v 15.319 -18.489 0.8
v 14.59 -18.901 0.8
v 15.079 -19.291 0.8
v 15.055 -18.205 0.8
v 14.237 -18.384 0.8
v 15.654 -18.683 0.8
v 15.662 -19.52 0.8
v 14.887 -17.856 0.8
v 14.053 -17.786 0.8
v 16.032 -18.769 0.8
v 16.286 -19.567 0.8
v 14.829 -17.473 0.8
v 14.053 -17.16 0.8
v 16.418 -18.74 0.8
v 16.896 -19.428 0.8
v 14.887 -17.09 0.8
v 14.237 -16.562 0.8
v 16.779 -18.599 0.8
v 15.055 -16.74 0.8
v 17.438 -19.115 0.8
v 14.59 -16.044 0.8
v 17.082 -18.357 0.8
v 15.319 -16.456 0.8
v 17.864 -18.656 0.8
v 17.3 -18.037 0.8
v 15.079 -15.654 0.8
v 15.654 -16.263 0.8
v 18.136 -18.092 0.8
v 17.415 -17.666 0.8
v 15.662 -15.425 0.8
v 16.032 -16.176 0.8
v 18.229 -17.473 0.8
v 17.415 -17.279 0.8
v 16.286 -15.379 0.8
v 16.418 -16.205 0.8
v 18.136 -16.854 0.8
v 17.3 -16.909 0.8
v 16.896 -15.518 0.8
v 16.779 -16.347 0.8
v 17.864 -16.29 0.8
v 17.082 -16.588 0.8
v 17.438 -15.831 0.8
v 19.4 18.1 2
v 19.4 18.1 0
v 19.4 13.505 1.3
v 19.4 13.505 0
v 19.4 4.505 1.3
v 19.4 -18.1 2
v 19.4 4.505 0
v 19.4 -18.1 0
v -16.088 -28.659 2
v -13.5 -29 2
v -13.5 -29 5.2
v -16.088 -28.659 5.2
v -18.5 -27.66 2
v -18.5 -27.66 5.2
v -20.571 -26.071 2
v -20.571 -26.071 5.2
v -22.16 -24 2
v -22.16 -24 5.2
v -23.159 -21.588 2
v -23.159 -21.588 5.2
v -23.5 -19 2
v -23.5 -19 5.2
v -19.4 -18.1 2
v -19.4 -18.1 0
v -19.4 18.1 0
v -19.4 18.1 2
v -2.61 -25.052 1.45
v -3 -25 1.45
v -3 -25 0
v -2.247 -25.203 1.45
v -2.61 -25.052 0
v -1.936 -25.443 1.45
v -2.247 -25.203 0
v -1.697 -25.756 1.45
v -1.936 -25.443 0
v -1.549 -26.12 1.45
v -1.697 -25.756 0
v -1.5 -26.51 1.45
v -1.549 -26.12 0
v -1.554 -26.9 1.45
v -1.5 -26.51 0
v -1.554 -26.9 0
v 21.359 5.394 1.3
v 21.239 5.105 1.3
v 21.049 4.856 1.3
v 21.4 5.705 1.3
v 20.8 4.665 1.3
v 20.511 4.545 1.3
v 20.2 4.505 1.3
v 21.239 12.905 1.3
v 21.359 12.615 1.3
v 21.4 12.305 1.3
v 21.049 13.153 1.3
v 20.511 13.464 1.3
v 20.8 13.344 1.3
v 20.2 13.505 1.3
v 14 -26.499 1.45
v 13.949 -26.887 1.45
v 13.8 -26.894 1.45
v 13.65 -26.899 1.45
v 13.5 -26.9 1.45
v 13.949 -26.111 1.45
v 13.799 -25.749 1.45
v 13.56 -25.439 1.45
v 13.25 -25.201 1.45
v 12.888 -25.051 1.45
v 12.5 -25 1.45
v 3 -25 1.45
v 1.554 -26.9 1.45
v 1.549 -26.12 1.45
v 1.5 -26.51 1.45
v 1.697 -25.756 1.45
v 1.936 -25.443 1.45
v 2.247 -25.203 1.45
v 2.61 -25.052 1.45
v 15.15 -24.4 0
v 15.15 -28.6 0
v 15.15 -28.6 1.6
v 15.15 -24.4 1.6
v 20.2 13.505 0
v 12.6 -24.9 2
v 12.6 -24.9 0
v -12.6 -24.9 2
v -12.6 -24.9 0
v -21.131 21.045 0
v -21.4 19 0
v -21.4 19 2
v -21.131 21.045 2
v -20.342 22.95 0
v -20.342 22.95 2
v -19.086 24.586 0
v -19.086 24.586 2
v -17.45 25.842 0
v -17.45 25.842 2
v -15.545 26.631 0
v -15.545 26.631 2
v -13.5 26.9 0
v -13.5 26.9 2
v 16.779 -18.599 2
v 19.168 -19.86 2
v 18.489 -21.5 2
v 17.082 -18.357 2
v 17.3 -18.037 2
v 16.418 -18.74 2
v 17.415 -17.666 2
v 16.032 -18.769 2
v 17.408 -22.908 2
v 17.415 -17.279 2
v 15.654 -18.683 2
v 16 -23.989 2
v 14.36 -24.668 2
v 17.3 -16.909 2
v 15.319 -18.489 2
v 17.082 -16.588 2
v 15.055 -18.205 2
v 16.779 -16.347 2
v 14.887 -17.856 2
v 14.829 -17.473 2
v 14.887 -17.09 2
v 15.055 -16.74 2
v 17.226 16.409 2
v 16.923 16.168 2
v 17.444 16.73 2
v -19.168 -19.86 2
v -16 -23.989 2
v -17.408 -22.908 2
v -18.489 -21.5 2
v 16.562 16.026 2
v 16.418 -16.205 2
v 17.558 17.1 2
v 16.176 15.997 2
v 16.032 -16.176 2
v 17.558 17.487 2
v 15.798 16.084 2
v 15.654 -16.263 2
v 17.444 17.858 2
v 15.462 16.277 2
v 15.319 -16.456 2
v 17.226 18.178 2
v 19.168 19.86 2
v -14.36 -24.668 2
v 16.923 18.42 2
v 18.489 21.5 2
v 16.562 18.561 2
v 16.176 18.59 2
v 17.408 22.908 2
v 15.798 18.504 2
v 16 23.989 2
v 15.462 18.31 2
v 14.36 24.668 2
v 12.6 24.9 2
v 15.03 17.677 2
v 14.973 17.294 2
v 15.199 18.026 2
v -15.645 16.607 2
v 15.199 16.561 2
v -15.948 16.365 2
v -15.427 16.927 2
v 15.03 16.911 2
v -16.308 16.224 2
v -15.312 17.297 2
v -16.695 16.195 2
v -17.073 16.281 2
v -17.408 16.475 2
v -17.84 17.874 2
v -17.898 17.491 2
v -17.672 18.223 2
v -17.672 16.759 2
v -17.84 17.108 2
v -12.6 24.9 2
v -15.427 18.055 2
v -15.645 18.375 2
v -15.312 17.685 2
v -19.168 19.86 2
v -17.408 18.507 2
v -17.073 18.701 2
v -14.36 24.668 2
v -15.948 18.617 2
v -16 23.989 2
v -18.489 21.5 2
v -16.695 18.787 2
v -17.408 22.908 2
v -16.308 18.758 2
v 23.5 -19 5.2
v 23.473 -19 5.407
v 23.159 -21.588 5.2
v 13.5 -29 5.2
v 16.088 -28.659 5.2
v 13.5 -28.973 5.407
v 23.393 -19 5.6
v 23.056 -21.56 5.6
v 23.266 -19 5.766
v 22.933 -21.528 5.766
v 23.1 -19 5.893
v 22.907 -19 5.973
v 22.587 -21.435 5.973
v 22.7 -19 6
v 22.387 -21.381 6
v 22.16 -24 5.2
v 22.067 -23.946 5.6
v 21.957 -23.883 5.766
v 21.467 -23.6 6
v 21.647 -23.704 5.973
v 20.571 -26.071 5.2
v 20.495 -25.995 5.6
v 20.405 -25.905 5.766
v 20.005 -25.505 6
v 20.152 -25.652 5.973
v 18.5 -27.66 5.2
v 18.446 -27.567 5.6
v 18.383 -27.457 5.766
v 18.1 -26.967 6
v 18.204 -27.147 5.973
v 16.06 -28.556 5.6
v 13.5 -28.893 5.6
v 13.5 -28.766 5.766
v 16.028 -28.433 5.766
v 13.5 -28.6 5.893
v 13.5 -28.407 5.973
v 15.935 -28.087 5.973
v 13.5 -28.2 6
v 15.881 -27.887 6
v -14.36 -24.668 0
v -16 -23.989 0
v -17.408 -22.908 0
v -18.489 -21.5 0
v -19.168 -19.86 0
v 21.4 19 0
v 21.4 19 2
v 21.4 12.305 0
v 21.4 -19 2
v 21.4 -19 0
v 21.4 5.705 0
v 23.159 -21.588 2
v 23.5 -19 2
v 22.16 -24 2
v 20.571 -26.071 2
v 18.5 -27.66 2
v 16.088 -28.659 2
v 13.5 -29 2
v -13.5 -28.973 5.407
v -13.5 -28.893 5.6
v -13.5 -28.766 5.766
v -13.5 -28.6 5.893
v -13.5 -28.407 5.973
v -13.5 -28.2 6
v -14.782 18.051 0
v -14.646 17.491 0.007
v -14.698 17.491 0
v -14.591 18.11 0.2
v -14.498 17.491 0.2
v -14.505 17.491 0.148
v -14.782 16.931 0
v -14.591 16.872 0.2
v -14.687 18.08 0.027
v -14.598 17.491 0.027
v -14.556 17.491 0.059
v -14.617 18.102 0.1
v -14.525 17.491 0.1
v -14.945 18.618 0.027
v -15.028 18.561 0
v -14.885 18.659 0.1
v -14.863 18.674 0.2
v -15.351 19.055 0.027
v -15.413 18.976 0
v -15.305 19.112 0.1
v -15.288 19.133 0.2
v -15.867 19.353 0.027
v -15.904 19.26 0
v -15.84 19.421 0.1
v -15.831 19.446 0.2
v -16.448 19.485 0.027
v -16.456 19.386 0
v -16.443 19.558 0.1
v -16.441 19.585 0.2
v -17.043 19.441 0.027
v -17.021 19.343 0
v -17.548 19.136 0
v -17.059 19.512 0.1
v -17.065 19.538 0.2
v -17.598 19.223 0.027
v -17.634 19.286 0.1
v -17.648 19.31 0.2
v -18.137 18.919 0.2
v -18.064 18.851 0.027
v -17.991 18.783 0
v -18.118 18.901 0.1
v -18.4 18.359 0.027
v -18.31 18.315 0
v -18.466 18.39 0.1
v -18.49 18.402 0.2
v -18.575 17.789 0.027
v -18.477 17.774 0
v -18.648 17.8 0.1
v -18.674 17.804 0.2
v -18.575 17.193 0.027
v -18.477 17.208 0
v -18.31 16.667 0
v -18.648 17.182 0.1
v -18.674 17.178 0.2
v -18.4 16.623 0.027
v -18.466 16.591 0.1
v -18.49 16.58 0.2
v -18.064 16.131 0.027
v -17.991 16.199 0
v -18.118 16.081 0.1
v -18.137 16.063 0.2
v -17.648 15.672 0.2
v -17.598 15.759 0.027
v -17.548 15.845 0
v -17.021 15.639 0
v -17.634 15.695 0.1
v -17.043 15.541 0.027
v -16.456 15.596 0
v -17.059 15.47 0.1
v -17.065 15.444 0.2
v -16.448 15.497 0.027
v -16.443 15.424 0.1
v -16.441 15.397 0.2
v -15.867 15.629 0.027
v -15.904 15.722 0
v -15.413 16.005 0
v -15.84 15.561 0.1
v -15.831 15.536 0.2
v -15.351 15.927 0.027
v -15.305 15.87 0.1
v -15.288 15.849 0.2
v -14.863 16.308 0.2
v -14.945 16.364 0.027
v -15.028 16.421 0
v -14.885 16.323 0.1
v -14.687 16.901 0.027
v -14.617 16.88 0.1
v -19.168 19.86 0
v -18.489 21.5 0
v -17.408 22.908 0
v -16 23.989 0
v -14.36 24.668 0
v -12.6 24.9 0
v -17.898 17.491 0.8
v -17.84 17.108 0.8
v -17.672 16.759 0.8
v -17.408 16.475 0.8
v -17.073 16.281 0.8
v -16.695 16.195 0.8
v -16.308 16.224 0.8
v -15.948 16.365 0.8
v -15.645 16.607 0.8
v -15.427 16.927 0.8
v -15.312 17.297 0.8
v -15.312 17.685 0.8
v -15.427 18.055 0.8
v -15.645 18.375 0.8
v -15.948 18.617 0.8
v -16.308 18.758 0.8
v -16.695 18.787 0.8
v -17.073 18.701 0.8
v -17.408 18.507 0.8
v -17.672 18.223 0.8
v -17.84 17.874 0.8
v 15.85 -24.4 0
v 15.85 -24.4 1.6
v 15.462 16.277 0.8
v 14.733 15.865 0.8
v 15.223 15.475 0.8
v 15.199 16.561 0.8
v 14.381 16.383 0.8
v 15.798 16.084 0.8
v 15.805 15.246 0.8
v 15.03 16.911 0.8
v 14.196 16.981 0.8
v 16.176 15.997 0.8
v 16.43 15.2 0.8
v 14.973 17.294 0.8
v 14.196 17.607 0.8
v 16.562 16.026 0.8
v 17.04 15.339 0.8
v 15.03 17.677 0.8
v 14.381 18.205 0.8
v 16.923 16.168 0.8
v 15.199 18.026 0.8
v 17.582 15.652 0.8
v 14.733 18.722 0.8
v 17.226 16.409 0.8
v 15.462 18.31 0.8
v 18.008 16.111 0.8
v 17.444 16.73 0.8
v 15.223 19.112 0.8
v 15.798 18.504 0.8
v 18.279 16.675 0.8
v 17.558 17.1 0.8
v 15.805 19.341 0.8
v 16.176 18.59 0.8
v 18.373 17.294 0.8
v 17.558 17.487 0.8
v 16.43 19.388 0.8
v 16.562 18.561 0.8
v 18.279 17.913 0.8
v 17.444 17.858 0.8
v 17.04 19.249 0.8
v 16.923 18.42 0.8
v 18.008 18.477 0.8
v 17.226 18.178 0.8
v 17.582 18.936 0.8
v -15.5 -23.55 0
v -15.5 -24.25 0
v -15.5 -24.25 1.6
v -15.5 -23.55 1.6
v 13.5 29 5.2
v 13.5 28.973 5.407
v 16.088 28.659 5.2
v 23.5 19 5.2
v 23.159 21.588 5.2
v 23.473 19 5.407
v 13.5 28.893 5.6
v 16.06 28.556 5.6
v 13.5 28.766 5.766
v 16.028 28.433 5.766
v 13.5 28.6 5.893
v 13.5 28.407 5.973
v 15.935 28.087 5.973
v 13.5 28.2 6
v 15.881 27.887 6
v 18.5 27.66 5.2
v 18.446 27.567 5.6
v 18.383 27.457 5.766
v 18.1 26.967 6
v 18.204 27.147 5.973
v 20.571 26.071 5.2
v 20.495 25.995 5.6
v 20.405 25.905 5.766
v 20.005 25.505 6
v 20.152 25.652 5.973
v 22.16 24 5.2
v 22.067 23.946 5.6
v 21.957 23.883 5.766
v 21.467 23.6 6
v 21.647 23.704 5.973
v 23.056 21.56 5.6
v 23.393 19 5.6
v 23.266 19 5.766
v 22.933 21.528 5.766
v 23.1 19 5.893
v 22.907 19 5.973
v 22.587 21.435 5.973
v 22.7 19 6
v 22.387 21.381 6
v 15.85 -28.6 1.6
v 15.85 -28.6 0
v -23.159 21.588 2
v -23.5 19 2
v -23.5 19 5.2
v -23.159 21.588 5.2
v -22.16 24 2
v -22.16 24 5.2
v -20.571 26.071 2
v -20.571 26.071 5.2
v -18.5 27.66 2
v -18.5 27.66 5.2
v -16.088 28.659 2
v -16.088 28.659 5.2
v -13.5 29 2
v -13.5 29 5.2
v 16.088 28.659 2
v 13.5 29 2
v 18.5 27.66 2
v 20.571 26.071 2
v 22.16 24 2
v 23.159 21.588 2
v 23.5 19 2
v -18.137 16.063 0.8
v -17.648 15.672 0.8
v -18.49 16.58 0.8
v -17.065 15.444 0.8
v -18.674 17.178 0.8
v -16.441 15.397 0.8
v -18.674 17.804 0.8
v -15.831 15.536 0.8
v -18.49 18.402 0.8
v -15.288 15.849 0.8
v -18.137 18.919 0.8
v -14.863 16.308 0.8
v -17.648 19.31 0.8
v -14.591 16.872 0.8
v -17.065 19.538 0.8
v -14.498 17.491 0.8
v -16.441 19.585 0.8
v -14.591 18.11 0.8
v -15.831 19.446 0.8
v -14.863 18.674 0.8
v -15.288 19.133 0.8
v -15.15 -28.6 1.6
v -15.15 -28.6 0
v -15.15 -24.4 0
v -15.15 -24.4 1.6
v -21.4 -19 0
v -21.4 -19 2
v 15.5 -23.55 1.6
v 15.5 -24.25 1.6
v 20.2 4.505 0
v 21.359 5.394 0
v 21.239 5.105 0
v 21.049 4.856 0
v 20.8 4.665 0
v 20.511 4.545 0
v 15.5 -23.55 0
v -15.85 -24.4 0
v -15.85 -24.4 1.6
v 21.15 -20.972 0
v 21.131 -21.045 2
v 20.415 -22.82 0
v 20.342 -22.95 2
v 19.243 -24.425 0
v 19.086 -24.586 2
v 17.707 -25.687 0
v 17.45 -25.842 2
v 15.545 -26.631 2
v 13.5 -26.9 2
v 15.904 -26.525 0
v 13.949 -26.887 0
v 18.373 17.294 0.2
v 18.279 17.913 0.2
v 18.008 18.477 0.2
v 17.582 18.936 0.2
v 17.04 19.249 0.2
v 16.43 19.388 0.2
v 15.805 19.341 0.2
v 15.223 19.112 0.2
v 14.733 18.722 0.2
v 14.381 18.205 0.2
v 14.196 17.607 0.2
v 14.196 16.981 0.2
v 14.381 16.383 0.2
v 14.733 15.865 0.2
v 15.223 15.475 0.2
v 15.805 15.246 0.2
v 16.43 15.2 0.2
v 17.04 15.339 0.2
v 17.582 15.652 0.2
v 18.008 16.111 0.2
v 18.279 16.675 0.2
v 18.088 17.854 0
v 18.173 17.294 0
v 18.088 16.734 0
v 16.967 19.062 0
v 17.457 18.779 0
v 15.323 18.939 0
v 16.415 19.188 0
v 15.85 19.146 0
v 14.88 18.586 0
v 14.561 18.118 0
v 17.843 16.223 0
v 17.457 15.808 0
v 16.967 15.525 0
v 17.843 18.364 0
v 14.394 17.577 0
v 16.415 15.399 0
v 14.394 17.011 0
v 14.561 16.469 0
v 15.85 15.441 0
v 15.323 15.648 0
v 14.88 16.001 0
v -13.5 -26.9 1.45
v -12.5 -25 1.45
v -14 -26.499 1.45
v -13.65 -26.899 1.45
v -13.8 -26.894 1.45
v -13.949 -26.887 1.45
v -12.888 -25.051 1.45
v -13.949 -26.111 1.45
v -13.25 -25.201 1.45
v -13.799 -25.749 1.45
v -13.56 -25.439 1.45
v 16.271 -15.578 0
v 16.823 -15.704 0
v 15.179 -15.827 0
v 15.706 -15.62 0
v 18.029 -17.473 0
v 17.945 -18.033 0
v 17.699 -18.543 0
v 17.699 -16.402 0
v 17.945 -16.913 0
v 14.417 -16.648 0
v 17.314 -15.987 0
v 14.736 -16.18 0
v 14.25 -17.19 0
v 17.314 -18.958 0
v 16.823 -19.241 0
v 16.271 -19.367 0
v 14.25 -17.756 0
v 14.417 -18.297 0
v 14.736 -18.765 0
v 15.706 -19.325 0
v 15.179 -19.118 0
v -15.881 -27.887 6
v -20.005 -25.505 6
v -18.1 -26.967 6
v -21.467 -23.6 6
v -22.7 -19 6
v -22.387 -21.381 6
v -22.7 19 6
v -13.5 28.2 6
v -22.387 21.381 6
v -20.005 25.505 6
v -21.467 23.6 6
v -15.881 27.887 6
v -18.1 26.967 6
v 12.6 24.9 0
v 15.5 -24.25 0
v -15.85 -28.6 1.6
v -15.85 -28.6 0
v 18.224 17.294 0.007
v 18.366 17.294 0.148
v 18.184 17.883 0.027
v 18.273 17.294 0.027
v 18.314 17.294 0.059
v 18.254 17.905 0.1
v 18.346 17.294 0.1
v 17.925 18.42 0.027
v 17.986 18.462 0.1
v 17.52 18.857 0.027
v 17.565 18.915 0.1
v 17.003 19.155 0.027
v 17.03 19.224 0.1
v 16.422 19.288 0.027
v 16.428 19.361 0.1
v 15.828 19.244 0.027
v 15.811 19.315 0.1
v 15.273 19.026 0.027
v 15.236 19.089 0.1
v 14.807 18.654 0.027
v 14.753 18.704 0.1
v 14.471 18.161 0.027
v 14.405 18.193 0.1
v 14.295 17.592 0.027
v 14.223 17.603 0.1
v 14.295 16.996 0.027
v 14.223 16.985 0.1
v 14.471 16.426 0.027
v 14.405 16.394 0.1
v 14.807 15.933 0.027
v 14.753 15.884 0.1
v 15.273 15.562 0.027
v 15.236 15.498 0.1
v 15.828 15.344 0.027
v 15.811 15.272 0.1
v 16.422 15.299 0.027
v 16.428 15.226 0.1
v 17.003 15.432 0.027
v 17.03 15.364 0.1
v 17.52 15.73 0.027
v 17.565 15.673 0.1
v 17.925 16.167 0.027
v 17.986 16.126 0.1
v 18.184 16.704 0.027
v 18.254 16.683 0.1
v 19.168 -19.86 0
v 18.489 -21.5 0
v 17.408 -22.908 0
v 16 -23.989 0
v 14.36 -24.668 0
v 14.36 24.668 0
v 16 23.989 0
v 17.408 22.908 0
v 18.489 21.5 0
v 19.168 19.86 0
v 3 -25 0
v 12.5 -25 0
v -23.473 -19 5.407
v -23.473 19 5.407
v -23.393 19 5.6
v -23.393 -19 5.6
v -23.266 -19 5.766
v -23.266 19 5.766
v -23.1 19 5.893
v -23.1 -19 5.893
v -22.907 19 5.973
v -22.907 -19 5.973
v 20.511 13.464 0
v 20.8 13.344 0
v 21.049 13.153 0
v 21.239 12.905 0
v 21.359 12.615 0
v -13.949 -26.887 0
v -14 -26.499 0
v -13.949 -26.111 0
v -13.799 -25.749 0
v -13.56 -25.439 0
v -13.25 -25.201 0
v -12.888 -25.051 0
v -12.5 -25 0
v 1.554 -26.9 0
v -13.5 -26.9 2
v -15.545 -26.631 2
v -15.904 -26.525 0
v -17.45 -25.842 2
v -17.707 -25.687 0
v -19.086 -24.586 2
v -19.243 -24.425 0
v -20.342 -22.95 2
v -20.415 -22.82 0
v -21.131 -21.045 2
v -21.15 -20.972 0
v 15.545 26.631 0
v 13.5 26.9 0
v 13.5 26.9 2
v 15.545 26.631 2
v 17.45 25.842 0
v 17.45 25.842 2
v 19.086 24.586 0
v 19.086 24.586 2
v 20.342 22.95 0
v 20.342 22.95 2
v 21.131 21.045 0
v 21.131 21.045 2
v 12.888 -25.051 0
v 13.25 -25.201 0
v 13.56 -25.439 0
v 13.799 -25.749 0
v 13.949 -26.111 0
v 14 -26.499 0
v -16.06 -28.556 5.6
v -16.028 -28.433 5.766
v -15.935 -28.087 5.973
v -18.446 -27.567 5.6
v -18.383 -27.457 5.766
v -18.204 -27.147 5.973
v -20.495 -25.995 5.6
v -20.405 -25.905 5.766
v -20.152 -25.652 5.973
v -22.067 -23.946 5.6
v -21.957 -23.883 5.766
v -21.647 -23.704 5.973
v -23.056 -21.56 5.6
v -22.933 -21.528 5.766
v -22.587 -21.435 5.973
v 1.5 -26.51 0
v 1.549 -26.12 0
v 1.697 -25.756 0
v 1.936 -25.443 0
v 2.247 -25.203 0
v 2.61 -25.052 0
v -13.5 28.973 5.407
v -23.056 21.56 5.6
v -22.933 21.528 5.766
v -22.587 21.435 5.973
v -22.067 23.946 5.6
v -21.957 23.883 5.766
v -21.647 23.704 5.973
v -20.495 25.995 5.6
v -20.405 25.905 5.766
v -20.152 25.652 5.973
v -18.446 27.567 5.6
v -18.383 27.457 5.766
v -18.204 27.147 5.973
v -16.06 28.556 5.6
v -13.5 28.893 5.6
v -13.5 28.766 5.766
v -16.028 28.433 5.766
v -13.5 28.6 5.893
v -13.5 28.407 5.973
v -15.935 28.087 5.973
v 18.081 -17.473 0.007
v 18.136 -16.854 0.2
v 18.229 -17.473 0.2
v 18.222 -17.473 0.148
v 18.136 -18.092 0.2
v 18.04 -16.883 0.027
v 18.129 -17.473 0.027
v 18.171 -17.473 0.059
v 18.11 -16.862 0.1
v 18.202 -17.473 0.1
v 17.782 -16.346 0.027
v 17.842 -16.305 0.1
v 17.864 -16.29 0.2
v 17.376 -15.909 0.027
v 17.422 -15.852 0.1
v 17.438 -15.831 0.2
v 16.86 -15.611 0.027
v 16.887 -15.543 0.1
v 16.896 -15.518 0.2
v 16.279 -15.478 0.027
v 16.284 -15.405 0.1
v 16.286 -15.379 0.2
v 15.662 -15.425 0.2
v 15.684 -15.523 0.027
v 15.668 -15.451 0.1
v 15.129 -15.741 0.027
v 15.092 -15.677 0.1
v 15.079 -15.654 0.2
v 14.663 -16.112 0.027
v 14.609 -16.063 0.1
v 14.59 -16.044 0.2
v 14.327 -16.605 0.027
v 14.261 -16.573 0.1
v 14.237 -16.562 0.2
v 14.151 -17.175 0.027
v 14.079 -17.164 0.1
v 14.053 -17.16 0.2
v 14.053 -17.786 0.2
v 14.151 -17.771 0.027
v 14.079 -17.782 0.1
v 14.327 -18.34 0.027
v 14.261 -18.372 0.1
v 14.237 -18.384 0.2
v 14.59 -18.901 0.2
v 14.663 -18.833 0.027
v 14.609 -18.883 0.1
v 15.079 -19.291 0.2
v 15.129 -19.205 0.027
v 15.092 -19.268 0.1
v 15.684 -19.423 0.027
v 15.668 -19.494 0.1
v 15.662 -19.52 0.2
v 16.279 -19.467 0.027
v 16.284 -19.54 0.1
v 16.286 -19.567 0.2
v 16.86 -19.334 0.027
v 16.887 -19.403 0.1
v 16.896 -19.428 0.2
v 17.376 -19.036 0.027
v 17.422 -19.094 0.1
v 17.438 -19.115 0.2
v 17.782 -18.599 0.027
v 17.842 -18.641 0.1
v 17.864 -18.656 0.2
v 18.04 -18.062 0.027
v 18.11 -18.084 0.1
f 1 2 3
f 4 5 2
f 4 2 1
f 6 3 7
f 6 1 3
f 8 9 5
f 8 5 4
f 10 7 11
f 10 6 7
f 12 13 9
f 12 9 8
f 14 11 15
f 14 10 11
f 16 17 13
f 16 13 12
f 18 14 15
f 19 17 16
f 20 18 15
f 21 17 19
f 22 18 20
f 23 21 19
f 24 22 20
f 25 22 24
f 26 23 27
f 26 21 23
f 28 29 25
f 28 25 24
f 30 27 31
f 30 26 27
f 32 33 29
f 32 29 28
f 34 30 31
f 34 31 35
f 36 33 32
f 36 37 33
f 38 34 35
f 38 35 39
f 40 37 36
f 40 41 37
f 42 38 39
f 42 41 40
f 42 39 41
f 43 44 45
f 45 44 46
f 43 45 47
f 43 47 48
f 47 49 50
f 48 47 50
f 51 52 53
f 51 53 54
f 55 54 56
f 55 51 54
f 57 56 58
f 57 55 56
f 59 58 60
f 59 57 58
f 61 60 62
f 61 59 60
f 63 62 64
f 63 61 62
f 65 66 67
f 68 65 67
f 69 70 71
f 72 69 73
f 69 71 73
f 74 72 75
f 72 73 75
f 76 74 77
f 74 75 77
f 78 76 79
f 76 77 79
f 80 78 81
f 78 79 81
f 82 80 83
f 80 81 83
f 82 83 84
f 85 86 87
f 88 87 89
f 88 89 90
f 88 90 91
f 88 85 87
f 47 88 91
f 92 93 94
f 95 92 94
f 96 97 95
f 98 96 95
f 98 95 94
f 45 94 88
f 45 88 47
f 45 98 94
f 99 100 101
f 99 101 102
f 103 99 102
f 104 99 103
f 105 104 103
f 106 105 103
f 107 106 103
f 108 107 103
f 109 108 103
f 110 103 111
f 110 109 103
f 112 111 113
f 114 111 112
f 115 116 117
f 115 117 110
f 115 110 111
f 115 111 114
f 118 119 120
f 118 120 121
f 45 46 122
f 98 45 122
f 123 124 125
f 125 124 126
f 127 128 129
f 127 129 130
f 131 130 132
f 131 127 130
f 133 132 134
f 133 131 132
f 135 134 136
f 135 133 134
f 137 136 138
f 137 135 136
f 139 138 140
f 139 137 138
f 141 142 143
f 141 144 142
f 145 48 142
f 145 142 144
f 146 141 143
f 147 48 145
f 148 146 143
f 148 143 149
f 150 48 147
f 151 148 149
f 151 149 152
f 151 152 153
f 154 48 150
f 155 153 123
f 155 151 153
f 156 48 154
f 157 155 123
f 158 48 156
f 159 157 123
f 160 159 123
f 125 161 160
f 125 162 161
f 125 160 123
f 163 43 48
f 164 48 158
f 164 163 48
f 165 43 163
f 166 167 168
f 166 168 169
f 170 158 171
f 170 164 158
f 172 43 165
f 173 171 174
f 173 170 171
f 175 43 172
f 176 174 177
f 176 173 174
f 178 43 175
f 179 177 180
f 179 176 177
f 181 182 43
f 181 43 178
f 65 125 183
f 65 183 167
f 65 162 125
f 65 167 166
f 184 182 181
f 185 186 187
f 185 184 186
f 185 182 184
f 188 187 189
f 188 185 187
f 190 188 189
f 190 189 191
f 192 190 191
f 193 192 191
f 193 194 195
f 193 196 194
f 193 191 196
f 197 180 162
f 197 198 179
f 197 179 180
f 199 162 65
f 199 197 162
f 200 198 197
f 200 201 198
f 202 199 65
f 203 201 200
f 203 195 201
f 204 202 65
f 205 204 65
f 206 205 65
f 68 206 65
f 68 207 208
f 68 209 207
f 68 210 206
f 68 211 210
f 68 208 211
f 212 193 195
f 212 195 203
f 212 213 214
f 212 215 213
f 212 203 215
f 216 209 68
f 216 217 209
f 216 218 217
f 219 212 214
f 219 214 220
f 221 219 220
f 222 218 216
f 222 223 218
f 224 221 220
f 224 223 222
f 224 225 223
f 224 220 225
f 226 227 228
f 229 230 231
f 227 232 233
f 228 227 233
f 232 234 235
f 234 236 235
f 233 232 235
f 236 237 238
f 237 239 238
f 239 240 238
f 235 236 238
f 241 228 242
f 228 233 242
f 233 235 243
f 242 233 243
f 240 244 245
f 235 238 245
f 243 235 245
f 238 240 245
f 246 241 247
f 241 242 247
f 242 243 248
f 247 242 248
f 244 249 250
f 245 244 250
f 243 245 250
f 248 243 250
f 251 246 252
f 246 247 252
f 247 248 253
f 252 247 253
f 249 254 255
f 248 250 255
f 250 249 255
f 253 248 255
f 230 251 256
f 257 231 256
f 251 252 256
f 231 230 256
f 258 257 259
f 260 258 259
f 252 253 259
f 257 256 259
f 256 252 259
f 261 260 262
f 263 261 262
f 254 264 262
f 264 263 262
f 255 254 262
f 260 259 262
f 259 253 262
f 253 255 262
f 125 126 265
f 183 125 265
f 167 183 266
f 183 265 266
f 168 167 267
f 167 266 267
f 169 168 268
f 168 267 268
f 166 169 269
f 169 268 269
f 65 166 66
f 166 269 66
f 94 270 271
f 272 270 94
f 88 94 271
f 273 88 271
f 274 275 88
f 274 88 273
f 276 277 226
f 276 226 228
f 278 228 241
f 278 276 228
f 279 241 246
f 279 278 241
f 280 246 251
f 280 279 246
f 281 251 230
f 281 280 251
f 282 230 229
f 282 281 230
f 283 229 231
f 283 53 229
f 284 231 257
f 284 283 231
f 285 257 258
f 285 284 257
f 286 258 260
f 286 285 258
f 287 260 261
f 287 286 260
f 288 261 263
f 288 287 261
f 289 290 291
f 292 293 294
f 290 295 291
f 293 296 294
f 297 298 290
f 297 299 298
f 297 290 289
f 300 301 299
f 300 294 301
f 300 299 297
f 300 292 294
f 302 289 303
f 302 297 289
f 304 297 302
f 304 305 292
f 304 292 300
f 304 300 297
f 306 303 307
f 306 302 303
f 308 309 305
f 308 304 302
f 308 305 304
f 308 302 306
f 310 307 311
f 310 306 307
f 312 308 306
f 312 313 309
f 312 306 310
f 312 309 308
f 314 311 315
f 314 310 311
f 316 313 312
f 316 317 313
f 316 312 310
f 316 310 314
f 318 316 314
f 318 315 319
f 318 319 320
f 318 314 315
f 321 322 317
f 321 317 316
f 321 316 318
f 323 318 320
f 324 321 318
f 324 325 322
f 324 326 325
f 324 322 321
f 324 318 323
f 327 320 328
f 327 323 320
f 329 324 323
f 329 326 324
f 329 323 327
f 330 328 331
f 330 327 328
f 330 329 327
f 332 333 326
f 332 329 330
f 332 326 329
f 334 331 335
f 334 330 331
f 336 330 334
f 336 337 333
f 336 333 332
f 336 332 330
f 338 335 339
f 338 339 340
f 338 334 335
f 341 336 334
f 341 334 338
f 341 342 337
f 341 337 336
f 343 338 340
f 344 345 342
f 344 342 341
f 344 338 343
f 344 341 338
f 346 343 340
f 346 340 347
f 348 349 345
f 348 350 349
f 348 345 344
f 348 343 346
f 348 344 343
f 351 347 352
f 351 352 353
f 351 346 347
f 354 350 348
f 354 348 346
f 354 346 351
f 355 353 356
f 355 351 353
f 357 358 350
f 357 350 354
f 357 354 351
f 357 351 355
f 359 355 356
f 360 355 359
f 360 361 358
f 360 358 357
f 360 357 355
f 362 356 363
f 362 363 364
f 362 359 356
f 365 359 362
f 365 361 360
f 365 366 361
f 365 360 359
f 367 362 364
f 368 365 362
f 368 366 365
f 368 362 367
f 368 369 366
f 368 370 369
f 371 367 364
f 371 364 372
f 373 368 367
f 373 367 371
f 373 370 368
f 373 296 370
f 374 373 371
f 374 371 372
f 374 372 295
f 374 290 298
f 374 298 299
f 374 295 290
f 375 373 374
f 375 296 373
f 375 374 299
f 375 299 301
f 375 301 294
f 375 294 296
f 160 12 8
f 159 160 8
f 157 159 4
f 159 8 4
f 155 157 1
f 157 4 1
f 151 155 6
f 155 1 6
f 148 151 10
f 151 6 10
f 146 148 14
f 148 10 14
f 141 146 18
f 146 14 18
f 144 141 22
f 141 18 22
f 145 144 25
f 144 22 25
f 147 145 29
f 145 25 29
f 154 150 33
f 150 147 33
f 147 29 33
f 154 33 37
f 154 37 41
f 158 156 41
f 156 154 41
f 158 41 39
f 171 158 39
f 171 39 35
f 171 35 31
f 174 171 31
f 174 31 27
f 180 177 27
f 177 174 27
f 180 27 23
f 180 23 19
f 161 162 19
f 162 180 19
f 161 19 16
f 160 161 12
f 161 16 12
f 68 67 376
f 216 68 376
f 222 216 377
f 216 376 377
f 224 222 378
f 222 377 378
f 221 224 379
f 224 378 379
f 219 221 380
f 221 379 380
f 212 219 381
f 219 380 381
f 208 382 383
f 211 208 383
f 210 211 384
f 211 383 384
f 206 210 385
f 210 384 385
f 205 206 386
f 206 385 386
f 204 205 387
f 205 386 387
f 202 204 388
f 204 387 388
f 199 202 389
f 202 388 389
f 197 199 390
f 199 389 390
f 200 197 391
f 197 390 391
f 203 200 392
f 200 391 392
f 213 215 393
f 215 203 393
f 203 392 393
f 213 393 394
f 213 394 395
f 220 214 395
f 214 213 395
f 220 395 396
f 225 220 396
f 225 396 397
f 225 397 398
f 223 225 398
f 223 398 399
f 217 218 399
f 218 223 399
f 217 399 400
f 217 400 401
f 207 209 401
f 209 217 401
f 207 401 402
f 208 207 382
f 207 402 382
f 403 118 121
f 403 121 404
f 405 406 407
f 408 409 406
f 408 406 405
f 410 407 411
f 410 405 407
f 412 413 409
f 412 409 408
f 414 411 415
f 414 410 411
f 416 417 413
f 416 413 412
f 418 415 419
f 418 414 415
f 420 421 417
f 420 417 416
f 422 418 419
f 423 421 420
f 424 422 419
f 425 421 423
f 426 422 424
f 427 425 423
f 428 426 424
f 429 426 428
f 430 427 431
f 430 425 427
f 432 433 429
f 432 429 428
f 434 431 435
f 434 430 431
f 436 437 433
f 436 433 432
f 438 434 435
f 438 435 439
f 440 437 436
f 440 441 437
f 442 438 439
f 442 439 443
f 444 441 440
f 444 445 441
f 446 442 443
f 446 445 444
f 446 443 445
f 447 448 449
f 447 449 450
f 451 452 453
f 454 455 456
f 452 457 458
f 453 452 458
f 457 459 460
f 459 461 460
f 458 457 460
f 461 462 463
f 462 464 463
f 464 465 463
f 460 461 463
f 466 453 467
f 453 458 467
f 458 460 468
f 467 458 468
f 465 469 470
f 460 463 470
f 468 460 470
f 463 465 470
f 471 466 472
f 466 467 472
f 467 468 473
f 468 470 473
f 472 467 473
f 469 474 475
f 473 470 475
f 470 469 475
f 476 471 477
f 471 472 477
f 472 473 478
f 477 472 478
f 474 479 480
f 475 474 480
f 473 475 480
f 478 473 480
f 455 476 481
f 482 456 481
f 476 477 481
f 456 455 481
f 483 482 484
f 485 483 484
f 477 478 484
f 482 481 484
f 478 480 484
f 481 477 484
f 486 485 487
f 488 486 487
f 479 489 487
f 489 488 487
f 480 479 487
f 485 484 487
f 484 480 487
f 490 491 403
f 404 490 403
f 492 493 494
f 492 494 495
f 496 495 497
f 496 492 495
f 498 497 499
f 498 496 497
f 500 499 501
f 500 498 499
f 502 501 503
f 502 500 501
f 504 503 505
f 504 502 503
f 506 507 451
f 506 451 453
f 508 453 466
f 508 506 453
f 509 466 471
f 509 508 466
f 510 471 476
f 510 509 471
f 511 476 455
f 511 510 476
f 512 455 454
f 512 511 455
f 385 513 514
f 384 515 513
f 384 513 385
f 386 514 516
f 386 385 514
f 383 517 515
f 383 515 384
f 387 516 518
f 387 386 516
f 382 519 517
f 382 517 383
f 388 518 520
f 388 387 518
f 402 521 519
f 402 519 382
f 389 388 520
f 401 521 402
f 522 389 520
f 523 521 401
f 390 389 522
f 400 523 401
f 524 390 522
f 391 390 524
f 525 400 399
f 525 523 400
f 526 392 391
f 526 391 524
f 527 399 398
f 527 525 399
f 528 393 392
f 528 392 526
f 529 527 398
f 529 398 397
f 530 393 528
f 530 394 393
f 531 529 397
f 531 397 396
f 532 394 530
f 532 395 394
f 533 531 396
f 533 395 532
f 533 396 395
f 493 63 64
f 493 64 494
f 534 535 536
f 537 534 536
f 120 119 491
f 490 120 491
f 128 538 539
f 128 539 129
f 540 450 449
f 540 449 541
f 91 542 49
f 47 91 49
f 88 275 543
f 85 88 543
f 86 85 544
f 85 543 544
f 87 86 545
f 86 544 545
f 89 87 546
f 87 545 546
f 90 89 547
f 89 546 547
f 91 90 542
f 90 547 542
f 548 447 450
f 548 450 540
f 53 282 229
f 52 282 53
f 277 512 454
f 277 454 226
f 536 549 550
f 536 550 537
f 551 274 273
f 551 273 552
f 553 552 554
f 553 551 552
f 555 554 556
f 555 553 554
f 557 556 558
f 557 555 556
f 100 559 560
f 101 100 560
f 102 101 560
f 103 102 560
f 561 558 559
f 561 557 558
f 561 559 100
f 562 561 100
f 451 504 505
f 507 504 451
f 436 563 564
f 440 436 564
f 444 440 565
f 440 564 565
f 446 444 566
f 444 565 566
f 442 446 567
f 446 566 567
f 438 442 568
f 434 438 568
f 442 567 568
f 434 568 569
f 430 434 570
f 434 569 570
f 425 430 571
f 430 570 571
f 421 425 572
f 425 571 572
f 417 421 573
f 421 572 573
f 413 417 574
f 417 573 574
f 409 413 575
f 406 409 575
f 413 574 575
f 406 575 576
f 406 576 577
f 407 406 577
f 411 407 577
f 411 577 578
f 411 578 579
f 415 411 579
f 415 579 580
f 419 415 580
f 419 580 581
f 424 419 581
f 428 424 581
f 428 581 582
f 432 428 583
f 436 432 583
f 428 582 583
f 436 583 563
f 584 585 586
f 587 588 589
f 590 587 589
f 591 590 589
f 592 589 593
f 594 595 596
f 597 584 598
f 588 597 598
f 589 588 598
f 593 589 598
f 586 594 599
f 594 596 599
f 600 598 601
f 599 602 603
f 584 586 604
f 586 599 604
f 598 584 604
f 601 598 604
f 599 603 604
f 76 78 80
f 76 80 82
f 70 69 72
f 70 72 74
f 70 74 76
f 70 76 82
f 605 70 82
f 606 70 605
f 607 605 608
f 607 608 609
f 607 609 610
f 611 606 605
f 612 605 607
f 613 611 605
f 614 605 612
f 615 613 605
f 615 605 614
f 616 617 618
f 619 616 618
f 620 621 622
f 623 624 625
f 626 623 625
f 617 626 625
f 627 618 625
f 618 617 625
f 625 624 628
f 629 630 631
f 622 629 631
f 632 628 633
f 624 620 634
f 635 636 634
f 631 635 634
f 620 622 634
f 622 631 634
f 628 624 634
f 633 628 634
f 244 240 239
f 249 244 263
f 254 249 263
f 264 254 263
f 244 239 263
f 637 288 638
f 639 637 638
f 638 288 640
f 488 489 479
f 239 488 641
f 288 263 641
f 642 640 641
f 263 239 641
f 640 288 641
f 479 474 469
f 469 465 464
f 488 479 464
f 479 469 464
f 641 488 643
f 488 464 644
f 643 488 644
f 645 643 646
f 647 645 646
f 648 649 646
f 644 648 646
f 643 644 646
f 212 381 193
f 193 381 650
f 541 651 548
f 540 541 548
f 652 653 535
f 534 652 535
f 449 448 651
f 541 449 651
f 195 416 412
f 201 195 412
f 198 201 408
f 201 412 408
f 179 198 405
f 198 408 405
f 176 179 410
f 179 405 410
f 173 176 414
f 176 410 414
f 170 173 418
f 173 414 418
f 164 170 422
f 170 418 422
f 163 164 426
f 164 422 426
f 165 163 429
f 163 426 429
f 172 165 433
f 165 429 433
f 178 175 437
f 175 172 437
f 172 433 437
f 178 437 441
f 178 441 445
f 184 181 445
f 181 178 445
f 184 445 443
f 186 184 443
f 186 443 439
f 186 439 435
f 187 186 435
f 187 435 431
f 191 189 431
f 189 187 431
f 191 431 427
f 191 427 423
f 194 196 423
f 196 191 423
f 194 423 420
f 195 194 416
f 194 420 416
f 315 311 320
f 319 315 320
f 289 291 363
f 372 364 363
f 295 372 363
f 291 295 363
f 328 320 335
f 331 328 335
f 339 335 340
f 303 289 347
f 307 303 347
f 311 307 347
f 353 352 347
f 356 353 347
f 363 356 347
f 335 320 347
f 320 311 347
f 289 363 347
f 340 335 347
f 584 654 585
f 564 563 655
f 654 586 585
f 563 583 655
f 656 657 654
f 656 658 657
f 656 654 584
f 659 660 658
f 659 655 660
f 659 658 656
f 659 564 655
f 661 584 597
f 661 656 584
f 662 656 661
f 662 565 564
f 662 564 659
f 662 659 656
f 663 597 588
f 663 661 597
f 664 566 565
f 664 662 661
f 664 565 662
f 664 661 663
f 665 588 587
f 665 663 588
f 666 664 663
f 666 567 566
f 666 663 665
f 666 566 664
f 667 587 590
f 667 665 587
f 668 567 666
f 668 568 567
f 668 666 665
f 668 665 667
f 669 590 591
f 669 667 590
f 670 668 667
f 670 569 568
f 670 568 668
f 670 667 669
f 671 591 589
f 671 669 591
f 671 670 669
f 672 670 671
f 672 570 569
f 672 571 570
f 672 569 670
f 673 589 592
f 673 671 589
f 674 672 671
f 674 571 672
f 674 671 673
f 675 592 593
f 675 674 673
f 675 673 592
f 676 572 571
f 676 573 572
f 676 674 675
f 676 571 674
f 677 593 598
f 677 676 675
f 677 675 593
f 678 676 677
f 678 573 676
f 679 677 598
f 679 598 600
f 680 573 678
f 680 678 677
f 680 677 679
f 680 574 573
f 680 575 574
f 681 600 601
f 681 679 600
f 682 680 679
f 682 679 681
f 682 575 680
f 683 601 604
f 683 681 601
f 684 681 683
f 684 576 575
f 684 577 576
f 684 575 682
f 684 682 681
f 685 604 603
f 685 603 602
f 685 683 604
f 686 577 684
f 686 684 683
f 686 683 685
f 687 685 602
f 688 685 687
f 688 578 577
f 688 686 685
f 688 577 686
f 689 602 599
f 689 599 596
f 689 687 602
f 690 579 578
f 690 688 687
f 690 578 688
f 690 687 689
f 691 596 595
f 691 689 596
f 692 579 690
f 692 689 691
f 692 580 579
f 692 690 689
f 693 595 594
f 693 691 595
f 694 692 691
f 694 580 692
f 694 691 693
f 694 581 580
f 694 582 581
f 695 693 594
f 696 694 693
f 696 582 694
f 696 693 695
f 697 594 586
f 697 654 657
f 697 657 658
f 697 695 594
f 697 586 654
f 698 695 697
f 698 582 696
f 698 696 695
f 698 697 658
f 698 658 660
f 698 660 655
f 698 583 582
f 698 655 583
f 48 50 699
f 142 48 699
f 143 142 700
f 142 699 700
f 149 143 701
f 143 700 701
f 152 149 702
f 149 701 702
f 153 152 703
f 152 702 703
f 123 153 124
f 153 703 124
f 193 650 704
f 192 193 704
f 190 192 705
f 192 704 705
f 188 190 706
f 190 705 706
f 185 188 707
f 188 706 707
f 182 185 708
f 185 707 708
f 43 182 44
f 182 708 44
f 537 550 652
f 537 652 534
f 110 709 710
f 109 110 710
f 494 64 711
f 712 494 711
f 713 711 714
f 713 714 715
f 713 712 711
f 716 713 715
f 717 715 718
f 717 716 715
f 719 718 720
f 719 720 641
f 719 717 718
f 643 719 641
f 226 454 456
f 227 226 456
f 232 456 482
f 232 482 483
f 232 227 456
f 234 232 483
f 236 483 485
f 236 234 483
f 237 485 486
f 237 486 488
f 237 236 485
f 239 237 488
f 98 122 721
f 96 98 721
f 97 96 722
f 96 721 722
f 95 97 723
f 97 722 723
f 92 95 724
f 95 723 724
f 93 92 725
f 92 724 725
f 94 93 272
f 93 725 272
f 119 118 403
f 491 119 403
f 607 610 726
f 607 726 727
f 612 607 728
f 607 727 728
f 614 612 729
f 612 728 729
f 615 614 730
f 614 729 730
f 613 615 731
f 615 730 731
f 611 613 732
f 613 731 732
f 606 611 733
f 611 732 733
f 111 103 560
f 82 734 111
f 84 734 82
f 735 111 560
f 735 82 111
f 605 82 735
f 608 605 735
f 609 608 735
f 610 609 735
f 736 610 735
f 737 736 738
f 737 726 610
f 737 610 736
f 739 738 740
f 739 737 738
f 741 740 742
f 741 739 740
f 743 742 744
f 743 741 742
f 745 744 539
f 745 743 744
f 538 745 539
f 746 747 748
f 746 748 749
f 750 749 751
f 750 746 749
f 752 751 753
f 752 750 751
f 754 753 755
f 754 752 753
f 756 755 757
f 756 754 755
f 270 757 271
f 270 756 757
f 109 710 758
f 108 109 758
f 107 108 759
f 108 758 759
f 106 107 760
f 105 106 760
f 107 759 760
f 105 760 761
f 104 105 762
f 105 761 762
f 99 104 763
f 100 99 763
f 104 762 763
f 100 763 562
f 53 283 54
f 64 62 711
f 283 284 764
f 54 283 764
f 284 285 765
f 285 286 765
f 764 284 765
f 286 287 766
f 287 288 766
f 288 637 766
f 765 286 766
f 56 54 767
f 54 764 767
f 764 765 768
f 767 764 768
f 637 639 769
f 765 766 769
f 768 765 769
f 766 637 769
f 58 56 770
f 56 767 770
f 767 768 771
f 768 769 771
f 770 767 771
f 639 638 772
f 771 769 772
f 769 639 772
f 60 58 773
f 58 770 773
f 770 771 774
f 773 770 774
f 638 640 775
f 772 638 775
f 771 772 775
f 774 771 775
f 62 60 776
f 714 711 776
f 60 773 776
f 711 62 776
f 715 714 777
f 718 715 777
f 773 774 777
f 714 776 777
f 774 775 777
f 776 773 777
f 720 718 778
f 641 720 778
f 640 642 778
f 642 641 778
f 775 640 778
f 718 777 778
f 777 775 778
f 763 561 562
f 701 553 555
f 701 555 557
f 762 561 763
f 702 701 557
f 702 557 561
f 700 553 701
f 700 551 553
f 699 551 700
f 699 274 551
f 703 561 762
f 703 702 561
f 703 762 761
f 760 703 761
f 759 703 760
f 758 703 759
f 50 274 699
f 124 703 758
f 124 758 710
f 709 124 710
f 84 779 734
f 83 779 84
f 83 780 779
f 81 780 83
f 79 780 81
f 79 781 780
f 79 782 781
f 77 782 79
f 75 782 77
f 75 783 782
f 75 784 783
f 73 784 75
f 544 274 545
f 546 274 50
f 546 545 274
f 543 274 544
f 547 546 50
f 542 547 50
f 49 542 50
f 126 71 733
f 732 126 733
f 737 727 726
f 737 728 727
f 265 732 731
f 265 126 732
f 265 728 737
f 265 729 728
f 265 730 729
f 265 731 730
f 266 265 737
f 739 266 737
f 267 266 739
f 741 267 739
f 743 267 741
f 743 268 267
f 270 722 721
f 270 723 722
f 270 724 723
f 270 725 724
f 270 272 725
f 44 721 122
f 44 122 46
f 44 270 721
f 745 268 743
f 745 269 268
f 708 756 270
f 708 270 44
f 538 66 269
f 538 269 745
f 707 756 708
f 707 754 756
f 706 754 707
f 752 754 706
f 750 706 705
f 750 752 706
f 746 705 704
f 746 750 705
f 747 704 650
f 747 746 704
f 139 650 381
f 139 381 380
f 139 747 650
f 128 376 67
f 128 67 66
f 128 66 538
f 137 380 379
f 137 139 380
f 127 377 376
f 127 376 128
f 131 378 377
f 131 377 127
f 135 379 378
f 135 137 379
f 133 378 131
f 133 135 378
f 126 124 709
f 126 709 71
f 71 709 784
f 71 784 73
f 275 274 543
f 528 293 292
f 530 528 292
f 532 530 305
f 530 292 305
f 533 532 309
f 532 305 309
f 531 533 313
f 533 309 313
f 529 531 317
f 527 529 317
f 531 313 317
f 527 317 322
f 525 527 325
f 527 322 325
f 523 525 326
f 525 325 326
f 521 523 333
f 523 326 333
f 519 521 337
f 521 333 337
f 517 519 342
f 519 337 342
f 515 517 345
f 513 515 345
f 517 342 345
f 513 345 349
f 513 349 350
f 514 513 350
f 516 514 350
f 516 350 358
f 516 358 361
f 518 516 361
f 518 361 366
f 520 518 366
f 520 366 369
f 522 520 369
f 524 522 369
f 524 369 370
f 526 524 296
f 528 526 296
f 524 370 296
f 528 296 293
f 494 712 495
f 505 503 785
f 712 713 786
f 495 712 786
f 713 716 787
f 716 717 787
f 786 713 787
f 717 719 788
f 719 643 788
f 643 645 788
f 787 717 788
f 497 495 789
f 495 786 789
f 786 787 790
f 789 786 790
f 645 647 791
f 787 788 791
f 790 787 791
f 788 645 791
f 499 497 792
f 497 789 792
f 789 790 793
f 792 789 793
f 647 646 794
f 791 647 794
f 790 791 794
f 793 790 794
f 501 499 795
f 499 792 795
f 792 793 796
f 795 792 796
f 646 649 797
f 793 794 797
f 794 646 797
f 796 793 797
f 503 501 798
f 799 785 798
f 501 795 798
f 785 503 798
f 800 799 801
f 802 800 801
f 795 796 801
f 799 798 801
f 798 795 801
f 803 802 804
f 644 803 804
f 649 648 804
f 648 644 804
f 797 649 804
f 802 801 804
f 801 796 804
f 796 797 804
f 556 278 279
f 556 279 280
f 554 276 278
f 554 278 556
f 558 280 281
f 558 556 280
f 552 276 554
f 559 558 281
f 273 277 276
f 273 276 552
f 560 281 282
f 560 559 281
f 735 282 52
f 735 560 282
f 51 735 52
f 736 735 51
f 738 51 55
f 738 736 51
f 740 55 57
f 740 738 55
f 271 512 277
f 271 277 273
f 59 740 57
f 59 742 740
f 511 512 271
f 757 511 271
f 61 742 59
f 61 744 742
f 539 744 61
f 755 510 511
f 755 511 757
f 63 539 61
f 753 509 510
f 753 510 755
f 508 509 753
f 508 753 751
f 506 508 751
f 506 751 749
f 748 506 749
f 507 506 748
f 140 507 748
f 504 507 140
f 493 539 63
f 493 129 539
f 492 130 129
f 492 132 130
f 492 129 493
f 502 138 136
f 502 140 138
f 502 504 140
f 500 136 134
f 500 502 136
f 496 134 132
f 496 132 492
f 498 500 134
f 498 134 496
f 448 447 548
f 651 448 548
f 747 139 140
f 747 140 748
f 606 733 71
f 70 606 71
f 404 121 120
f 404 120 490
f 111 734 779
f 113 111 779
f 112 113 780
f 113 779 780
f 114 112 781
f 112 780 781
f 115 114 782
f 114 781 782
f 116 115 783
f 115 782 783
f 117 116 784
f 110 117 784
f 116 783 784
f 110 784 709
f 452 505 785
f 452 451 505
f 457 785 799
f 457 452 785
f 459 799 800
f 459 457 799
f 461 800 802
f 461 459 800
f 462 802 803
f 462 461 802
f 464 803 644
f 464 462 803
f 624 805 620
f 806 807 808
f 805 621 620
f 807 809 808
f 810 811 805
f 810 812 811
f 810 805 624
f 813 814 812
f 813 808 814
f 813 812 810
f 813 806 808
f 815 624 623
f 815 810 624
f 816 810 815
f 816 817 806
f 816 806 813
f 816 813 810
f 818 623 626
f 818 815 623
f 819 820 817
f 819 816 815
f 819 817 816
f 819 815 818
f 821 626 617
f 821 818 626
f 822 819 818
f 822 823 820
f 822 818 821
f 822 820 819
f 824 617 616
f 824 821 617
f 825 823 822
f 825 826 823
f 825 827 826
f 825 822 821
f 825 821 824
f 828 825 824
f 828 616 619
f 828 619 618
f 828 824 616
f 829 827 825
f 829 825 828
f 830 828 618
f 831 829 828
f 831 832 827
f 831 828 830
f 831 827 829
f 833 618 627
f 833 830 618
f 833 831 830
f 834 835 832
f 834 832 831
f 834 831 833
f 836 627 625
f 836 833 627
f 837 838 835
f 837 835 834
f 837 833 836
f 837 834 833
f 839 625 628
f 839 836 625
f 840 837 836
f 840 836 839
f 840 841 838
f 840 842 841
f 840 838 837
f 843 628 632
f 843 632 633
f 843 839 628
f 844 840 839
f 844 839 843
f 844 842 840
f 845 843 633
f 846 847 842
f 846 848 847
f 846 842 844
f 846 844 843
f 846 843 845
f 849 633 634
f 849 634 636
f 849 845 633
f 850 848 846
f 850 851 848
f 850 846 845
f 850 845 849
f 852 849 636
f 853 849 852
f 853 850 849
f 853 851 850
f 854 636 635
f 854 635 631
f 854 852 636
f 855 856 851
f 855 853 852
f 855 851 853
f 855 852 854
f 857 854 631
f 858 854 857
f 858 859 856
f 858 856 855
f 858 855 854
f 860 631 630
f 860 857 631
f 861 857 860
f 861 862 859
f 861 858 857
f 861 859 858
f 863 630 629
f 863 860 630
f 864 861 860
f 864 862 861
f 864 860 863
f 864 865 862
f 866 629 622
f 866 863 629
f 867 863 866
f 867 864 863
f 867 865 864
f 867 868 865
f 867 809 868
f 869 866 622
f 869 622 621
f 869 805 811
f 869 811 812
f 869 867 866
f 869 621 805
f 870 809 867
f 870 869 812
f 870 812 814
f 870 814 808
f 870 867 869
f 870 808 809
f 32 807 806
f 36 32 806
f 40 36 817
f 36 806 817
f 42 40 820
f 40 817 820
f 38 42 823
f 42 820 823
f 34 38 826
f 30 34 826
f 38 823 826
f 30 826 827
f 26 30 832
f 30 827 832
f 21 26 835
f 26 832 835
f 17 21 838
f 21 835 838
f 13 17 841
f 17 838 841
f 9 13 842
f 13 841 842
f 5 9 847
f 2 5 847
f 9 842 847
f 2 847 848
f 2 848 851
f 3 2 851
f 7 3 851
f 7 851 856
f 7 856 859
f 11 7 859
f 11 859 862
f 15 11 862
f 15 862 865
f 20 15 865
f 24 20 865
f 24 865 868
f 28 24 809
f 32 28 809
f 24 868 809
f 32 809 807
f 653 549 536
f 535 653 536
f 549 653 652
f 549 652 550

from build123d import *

# Parameters (mm, degrees)
LOWER_MATING_LIP_OUTER_2MM_OVERLAP_DEPTH       = 2
LOWER_MATING_LIP_INNER_CLEARANCE_DEPTH         = 2.3
LOWER_VISIBLE_BASE_4MM_DEPTH                   = 4
LOWER_BOTTOM_EDGE_SOFT_FILLET_R0_8_R           = 0.8
LOWER_USB_C_RIGHT_SIDE_LIP_CLEARANCE_AT_DEPTH  = 1.3
SKETCH_7_R                                     = 2.1
LOWER_PCB1_LOCATING_1_RIGHT_TOP_POST_BAS_DEPTH = 0.8
SKETCH_8_R                                     = 1.3
LOWER_PCB1_LOCATING_1_RIGHT_TOP_SOLID_PO_DEPTH = 2.5
LOWER_PCB1_LOCATING_1_RIGHT_TOP_SOLI_2_R       = 0.2
SKETCH_9_R                                     = 2.1
LOWER_PCB1_LOCATING_2_RIGHT_BOTTOM_POST_DEPTH  = 0.8
SKETCH_10_R                                    = 1.3
LOWER_PCB1_LOCATING_2_RIGHT_BOTTOM_SOLID_DEPTH = 2.5
LOWER_PCB1_LOCATING_2_RIGHT_BOTTOM_S_2_R       = 0.2
SKETCH_11_R                                    = 2.1
LOWER_PCB1_LOCATING_3_LEFT_TOP_POST_BASE_DEPTH = 0.8
SKETCH_12_R                                    = 1.3
LOWER_PCB1_LOCATING_3_LEFT_TOP_SOLID_POS_DEPTH = 2.5
LOWER_PCB1_LOCATING_3_LEFT_TOP_SOLID_2_R       = 0.2
LOWER_LANYARD_WET_ZONE_LEFT_OUTER_WINDOW_DEPTH = 1.45
LOWER_LANYARD_WET_ZONE_RIGHT_OUTER_WINDO_DEPTH = 1.45
SKETCH_16_W                                    = 31
SKETCH_16_H                                    = 0.7
LOWER_LANYARD_DRY_ZONE_SEAL_RIB_TOP_V7_DEPTH   = 1.6
SKETCH_17_W                                    = 0.7
SKETCH_17_H                                    = 4.2
LOWER_LANYARD_DRY_ZONE_SEAL_RIB_LEFT_V7_DEPTH  = 1.6
SKETCH_18_W                                    = 0.7
SKETCH_18_H                                    = 4.2
LOWER_LANYARD_DRY_ZONE_SEAL_RIB_RIGHT_V7_DEPTH = 1.6


with BuildPart() as part:
    # 草图1 → Lower_mating_lip_outer_2mm_overlap (new body)
    with BuildSketch(Plane.XY):
        with BuildLine():
            Line((-13.5, 26.9), (13.5, 26.9))
            ThreePointArc((13.5, 26.9), (19.086143571, 24.586143571), (21.4, 19))
            Line((21.4, 19), (21.4, -19))
            ThreePointArc((21.4, -19), (19.086143571, -24.586143571), (13.5, -26.9))
            Line((13.5, -26.9), (-13.5, -26.9))
            ThreePointArc((-13.5, -26.9), (-19.086143571, -24.586143571), (-21.4, -19))
            Line((-21.4, -19), (-21.4, 19))
            ThreePointArc((-21.4, 19), (-19.086143571, 24.586143571), (-13.5, 26.9))
        make_face()
    extrude(amount=LOWER_MATING_LIP_OUTER_2MM_OVERLAP_DEPTH)

    # 草图2 → Lower_mating_lip_inner_clearance (cut)
    with BuildSketch(Plane.XY):
        with BuildLine():
            Line((-12.6, 24.9), (12.6, 24.9))
            ThreePointArc((12.6, 24.9), (17.408326112, 22.908326112), (19.4, 18.1))
            Line((19.4, 18.1), (19.4, -18.1))
            ThreePointArc((19.4, -18.1), (17.408326112, -22.908326112), (12.6, -24.9))
            Line((12.6, -24.9), (-12.6, -24.9))
            ThreePointArc((-12.6, -24.9), (-17.408326112, -22.908326112), (-19.4, -18.1))
            Line((-19.4, -18.1), (-19.4, 18.1))
            ThreePointArc((-19.4, 18.1), (-17.408326112, 22.908326112), (-12.6, 24.9))
        make_face()
    extrude(amount=LOWER_MATING_LIP_INNER_CLEARANCE_DEPTH, mode=Mode.SUBTRACT)

    # 草图3 → Lower_visible_base_4mm (add)
    with BuildSketch(Plane.XY.offset(2)):
        with BuildLine():
            Line((-13.5, 29), (13.5, 29))
            ThreePointArc((13.5, 29), (20.571067812, 26.071067812), (23.5, 19))
            Line((23.5, 19), (23.5, -19))
            ThreePointArc((23.5, -19), (20.571067812, -26.071067812), (13.5, -29))
            Line((13.5, -29), (-13.5, -29))
            ThreePointArc((-13.5, -29), (-20.571067812, -26.071067812), (-23.5, -19))
            Line((-23.5, -19), (-23.5, 19))
            ThreePointArc((-23.5, 19), (-20.571067812, 26.071067812), (-13.5, 29))
        make_face()
    extrude(amount=LOWER_VISIBLE_BASE_4MM_DEPTH)

    # Lower_bottom_edge_soft_fillet_r0_8
    lower_bottom_edge_soft_fillet_r0_8_edges = [part.edges().sort_by_distance(p)[0] for p in [
        (-20.571067812, 26.071067812, 6),
        (-23.5, 0, 6),
        (-20.571067812, -26.071067812, 6),
        (0, -29, 6),
        (20.571067812, -26.071067812, 6),
        (23.5, 0, 6),
        (20.571067812, 26.071067812, 6),
        (0, 29, 6),
    ]]
    fillet(lower_bottom_edge_soft_fillet_r0_8_edges, radius=LOWER_BOTTOM_EDGE_SOFT_FILLET_R0_8_R)

    # 草图6 → Lower_USB_C_right_side_lip_clearance_at (cut)
    with BuildSketch(Plane.XY):
        with BuildLine():
            Line((18.2, 13.5045794), (20.2, 13.5045794))
            ThreePointArc((20.2, 13.5045794), (21.048528137, 13.153107537), (21.4, 12.3045794))
            Line((21.4, 12.3045794), (21.4, 5.7045794))
            ThreePointArc((21.4, 5.7045794), (21.048528137, 4.856051263), (20.2, 4.5045794))
            Line((20.2, 4.5045794), (18.2, 4.5045794))
            ThreePointArc((18.2, 4.5045794), (17.351471863, 4.856051263), (17, 5.7045794))
            Line((17, 5.7045794), (17, 12.3045794))
            ThreePointArc((17, 12.3045794), (17.351471863, 13.153107537), (18.2, 13.5045794))
        make_face()
    extrude(amount=LOWER_USB_C_RIGHT_SIDE_LIP_CLEARANCE_AT_DEPTH, mode=Mode.SUBTRACT)



with BuildPart() as body_2:
    # 草图7 → Lower_PCB1_locating_1_right_top_post_base_pad_d4_2_h0_8 (new body)
    with BuildSketch(Plane.XY):
        with Locations((16.2726751, 17.2936916)):
            Circle(SKETCH_7_R)
    extrude(amount=LOWER_PCB1_LOCATING_1_RIGHT_TOP_POST_BAS_DEPTH)


with BuildPart() as part_1:
    add(part.part)

    add(body_2.part)  # Lower_PCB1_locating_1_right_top_solid_po merges body 2
    # 草图8 → Lower_PCB1_locating_1_right_top_solid_po (add)
    with BuildSketch(Plane.XY):
        with Locations(Location((16.2726751, 17.2936916, 0), (0, 0, 180))):
            Circle(SKETCH_8_R)
    extrude(amount=LOWER_PCB1_LOCATING_1_RIGHT_TOP_SOLID_PO_DEPTH)

    # Lower_PCB1_locating_1_right_top_soli 2
    lower_pcb1_locating_1_right_top_soli_2_edges = [part_1.edges().sort_by_distance(p)[0] for p in [
        (14.1726751, 17.2936916, 0),
    ]]
    fillet(lower_pcb1_locating_1_right_top_soli_2_edges, radius=LOWER_PCB1_LOCATING_1_RIGHT_TOP_SOLI_2_R)



with BuildPart() as body_2_2:
    # 草图9 → Lower_PCB1_locating_2_right_bottom_post_base_pad_d4_2_h0_8 (new body)
    with BuildSketch(Plane.XY):
        with Locations((16.1290889, -17.4727108)):
            Circle(SKETCH_9_R)
    extrude(amount=LOWER_PCB1_LOCATING_2_RIGHT_BOTTOM_POST_DEPTH)


with BuildPart() as part_2:
    add(part_1.part)

    add(body_2_2.part)  # Lower_PCB1_locating_2_right_bottom_solid merges body 2 2
    # 草图10 → Lower_PCB1_locating_2_right_bottom_solid (add)
    with BuildSketch(Plane.XY):
        with Locations(Location((16.1290889, -17.4727108, 0), (0, 0, 180))):
            Circle(SKETCH_10_R)
    extrude(amount=LOWER_PCB1_LOCATING_2_RIGHT_BOTTOM_SOLID_DEPTH)

    # Lower_PCB1_locating_2_right_bottom_s 2
    lower_pcb1_locating_2_right_bottom_s_2_edges = [part_2.edges().sort_by_distance(p)[0] for p in [
        (14.0290889, -17.4727108, 0),
    ]]
    fillet(lower_pcb1_locating_2_right_bottom_s_2_edges, radius=LOWER_PCB1_LOCATING_2_RIGHT_BOTTOM_S_2_R)



with BuildPart() as body_2_3:
    # 草图11 → Lower_PCB1_locating_3_left_top_post_base_pad_d4_2_h0_8 (new body)
    with BuildSketch(Plane.XY):
        with Locations((-16.5977697, 17.4909226)):
            Circle(SKETCH_11_R)
    extrude(amount=LOWER_PCB1_LOCATING_3_LEFT_TOP_POST_BASE_DEPTH)


with BuildPart() as part_3:
    add(part_2.part)

    add(body_2_3.part)  # Lower_PCB1_locating_3_left_top_solid_pos merges body 2 3
    # 草图12 → Lower_PCB1_locating_3_left_top_solid_pos (add)
    with BuildSketch(Plane.XY):
        with Locations(Location((-16.5977697, 17.4909226, 0), (0, 0, 180))):
            Circle(SKETCH_12_R)
    extrude(amount=LOWER_PCB1_LOCATING_3_LEFT_TOP_SOLID_POS_DEPTH)

    # Lower_PCB1_locating_3_left_top_solid 2
    lower_pcb1_locating_3_left_top_solid_2_edges = [part_3.edges().sort_by_distance(p)[0] for p in [
        (-18.6977697, 17.4909226, 0),
    ]]
    fillet(lower_pcb1_locating_3_left_top_solid_2_edges, radius=LOWER_PCB1_LOCATING_3_LEFT_TOP_SOLID_2_R)

    # 草图14 → Lower_lanyard_wet_zone_left_outer_window_v7_lip1mm (cut)
    with BuildSketch(Plane.XY):
        with BuildLine():
            Line((-12.5, -25), (-3, -25))
            ThreePointArc((-3, -25), (-1.5, -26.5), (-3, -28))
            Line((-3, -28), (-12.5, -28))
            ThreePointArc((-12.5, -28), (-14, -26.5), (-12.5, -25))
        make_face()
    extrude(amount=LOWER_LANYARD_WET_ZONE_LEFT_OUTER_WINDOW_DEPTH, mode=Mode.SUBTRACT)

    # 草图15 → Lower_lanyard_wet_zone_right_outer_window_v7_lip1mm (cut)
    with BuildSketch(Plane.XY):
        with BuildLine():
            Line((3, -25), (12.5, -25))
            ThreePointArc((12.5, -25), (14, -26.5), (12.5, -28))
            Line((12.5, -28), (3, -28))
            ThreePointArc((3, -28), (1.5, -26.5), (3, -25))
        make_face()
    extrude(amount=LOWER_LANYARD_WET_ZONE_RIGHT_OUTER_WINDO_DEPTH, mode=Mode.SUBTRACT)


with BuildPart() as body_2_4:
    # 草图16 → Lower_lanyard_dry_zone_seal_rib_top_v7 (new body)
    with BuildSketch(Plane.XY):
        with Locations((0, -23.9)):
            Rectangle(SKETCH_16_W, SKETCH_16_H)
    extrude(amount=LOWER_LANYARD_DRY_ZONE_SEAL_RIB_TOP_V7_DEPTH)


with BuildPart() as body_3:
    # 草图17 → Lower_lanyard_dry_zone_seal_rib_left_v7 (new body)
    with BuildSketch(Plane.XY):
        with Locations((-15.5, -26.5)):
            Rectangle(SKETCH_17_W, SKETCH_17_H)
    extrude(amount=LOWER_LANYARD_DRY_ZONE_SEAL_RIB_LEFT_V7_DEPTH)


with BuildPart() as body_4:
    # 草图18 → Lower_lanyard_dry_zone_seal_rib_right_v7 (new body)
    with BuildSketch(Plane.XY):
        with Locations((15.5, -26.5)):
            Rectangle(SKETCH_18_W, SKETCH_18_H)
    extrude(amount=LOWER_LANYARD_DRY_ZONE_SEAL_RIB_RIGHT_V7_DEPTH)


solid = Compound([part_3.part, body_2_4.part, body_3.part, body_4.part])
